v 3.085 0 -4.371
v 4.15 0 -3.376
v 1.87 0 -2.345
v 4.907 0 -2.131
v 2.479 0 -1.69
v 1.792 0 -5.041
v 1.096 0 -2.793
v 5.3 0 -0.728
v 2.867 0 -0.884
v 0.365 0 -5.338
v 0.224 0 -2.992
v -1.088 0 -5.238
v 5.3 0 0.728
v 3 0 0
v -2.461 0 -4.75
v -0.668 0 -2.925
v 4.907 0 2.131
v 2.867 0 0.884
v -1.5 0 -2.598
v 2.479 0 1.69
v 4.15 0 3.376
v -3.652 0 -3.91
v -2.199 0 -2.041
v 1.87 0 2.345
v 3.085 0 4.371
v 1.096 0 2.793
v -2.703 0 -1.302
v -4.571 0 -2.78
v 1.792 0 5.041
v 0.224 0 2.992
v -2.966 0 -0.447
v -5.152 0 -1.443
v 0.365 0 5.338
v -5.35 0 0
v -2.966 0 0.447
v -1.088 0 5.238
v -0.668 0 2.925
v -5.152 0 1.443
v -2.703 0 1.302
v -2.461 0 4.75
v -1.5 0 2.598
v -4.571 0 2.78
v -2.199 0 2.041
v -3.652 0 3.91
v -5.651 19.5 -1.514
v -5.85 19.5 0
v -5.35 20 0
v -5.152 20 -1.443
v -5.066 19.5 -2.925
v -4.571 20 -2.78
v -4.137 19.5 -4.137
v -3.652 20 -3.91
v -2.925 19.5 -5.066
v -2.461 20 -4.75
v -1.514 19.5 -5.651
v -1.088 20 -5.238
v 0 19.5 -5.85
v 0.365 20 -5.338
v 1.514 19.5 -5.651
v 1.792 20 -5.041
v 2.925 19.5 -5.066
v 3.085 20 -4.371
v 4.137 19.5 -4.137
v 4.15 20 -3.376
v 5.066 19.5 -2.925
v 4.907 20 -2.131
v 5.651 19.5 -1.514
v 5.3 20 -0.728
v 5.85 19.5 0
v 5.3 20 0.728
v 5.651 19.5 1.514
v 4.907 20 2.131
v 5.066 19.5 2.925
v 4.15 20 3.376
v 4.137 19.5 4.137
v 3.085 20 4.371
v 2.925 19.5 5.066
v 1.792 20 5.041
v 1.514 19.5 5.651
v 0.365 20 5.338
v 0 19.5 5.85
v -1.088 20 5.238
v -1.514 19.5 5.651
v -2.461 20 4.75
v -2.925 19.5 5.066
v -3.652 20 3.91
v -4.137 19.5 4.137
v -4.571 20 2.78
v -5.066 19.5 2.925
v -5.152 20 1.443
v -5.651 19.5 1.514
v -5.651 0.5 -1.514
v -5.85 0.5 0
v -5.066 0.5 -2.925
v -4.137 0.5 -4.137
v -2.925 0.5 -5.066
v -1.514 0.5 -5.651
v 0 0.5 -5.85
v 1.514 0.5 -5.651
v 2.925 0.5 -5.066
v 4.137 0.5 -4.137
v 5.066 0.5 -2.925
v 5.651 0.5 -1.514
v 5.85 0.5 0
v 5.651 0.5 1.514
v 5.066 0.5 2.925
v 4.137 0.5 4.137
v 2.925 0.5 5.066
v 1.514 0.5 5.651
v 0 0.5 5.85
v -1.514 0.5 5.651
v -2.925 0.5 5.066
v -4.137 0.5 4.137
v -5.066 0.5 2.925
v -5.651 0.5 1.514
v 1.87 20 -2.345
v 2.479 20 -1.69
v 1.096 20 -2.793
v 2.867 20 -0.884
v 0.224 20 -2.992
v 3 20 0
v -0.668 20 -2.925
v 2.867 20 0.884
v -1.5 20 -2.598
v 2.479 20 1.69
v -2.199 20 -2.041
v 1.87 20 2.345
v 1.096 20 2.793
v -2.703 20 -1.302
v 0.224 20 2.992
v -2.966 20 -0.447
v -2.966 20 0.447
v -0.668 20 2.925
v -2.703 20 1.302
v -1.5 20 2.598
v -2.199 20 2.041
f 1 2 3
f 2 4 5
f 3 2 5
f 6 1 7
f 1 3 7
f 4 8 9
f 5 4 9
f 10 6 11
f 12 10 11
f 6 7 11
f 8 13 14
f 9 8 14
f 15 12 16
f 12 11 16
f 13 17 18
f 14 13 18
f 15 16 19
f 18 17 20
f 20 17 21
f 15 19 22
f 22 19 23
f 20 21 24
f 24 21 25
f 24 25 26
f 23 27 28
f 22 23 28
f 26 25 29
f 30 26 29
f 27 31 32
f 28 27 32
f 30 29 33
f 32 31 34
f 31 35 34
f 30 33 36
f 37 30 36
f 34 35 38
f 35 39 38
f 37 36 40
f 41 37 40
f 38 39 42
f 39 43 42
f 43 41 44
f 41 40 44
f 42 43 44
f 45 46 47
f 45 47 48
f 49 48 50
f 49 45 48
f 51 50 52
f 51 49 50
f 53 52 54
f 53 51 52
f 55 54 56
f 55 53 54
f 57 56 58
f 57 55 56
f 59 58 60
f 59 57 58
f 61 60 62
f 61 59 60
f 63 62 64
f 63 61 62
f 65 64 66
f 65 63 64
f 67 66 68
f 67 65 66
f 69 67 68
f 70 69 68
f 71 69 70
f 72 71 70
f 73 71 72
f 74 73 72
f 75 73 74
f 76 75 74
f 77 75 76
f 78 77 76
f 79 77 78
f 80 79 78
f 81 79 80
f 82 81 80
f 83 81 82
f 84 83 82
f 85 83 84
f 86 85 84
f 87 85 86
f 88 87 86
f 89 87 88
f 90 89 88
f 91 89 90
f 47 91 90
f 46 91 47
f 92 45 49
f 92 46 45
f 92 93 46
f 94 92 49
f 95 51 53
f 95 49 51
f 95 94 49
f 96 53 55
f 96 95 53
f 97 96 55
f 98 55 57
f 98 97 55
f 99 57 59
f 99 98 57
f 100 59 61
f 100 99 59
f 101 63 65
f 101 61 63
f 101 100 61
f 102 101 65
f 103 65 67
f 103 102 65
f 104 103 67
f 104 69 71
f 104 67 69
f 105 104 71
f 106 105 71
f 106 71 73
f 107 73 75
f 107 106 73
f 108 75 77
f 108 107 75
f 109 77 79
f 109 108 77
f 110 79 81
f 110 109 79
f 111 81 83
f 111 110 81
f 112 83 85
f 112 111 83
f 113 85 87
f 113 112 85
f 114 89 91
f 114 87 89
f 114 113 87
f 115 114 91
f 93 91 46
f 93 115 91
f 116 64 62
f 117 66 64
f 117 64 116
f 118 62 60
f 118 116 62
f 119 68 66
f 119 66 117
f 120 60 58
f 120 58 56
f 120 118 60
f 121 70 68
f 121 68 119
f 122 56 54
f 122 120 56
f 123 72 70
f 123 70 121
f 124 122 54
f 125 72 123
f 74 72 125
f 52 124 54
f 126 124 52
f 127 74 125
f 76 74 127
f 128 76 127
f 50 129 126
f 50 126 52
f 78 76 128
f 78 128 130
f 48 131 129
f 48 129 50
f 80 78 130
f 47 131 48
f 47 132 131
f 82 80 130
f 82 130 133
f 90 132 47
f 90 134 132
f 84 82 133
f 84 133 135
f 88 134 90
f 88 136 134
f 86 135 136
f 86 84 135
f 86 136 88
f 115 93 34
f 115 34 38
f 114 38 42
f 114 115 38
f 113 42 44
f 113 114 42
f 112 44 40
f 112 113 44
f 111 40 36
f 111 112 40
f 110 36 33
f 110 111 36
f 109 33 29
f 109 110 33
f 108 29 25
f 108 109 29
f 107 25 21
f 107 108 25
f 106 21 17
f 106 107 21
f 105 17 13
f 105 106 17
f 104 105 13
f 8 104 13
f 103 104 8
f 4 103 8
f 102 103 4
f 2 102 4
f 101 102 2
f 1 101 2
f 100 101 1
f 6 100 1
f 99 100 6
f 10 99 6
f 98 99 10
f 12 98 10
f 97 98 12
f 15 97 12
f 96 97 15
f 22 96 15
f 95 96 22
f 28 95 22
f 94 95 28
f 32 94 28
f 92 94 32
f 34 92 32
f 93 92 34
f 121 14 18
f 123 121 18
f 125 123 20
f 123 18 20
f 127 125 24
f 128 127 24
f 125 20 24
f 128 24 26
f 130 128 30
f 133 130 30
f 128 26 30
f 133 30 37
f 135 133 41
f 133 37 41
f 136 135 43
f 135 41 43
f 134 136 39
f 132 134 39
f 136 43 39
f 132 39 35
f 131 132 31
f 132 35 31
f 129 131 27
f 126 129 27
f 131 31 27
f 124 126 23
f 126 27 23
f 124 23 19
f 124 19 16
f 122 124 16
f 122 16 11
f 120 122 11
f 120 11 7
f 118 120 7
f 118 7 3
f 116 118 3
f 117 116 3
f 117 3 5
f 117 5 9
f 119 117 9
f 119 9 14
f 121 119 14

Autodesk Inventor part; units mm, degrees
ref_plane "YZ Plane" through (0, 0, 0) normal (1, 0, 0) x (0, 1, 0)
ref_plane "XZ Plane" through (0, 0, 0) normal (0, 1, 0) x (-1, 0, 0)
ref_plane "XY Plane" through (0, 0, 0) normal (0, 0, 1) x (1, 0, 0)
sketch "Skizze1" plane through (0, 0, 0) normal (0, 1, 0) x (-1, 0, 0)
  circle A0 centre (0, 0) radius 5.85
  dimension "d0" = 11.7
extrude "Extrusion1" add sketch "Skizze1" along normal blind 20
thread "Gewinde1" size "TR8x1.5" class "7e" standard "ISO Metric Trapezoidal Threads" length 13
sketch "Skizze3" plane through (0, 0, 0) normal (0, -1, 0) x (1, 0, 0)
  circle A0 centre (0, 0) radius 3
  dimension "d5" = 6
extrude "Extrusion2" cut sketch "Skizze3" against normal through all
chamfer "Fase1" distance 0.5 angle 45 2 edges at (5.85, 20, 0) (5.85, 0, 0)
properties part number "Schneckenwelle" material "Messing, weicher Gelbton"
